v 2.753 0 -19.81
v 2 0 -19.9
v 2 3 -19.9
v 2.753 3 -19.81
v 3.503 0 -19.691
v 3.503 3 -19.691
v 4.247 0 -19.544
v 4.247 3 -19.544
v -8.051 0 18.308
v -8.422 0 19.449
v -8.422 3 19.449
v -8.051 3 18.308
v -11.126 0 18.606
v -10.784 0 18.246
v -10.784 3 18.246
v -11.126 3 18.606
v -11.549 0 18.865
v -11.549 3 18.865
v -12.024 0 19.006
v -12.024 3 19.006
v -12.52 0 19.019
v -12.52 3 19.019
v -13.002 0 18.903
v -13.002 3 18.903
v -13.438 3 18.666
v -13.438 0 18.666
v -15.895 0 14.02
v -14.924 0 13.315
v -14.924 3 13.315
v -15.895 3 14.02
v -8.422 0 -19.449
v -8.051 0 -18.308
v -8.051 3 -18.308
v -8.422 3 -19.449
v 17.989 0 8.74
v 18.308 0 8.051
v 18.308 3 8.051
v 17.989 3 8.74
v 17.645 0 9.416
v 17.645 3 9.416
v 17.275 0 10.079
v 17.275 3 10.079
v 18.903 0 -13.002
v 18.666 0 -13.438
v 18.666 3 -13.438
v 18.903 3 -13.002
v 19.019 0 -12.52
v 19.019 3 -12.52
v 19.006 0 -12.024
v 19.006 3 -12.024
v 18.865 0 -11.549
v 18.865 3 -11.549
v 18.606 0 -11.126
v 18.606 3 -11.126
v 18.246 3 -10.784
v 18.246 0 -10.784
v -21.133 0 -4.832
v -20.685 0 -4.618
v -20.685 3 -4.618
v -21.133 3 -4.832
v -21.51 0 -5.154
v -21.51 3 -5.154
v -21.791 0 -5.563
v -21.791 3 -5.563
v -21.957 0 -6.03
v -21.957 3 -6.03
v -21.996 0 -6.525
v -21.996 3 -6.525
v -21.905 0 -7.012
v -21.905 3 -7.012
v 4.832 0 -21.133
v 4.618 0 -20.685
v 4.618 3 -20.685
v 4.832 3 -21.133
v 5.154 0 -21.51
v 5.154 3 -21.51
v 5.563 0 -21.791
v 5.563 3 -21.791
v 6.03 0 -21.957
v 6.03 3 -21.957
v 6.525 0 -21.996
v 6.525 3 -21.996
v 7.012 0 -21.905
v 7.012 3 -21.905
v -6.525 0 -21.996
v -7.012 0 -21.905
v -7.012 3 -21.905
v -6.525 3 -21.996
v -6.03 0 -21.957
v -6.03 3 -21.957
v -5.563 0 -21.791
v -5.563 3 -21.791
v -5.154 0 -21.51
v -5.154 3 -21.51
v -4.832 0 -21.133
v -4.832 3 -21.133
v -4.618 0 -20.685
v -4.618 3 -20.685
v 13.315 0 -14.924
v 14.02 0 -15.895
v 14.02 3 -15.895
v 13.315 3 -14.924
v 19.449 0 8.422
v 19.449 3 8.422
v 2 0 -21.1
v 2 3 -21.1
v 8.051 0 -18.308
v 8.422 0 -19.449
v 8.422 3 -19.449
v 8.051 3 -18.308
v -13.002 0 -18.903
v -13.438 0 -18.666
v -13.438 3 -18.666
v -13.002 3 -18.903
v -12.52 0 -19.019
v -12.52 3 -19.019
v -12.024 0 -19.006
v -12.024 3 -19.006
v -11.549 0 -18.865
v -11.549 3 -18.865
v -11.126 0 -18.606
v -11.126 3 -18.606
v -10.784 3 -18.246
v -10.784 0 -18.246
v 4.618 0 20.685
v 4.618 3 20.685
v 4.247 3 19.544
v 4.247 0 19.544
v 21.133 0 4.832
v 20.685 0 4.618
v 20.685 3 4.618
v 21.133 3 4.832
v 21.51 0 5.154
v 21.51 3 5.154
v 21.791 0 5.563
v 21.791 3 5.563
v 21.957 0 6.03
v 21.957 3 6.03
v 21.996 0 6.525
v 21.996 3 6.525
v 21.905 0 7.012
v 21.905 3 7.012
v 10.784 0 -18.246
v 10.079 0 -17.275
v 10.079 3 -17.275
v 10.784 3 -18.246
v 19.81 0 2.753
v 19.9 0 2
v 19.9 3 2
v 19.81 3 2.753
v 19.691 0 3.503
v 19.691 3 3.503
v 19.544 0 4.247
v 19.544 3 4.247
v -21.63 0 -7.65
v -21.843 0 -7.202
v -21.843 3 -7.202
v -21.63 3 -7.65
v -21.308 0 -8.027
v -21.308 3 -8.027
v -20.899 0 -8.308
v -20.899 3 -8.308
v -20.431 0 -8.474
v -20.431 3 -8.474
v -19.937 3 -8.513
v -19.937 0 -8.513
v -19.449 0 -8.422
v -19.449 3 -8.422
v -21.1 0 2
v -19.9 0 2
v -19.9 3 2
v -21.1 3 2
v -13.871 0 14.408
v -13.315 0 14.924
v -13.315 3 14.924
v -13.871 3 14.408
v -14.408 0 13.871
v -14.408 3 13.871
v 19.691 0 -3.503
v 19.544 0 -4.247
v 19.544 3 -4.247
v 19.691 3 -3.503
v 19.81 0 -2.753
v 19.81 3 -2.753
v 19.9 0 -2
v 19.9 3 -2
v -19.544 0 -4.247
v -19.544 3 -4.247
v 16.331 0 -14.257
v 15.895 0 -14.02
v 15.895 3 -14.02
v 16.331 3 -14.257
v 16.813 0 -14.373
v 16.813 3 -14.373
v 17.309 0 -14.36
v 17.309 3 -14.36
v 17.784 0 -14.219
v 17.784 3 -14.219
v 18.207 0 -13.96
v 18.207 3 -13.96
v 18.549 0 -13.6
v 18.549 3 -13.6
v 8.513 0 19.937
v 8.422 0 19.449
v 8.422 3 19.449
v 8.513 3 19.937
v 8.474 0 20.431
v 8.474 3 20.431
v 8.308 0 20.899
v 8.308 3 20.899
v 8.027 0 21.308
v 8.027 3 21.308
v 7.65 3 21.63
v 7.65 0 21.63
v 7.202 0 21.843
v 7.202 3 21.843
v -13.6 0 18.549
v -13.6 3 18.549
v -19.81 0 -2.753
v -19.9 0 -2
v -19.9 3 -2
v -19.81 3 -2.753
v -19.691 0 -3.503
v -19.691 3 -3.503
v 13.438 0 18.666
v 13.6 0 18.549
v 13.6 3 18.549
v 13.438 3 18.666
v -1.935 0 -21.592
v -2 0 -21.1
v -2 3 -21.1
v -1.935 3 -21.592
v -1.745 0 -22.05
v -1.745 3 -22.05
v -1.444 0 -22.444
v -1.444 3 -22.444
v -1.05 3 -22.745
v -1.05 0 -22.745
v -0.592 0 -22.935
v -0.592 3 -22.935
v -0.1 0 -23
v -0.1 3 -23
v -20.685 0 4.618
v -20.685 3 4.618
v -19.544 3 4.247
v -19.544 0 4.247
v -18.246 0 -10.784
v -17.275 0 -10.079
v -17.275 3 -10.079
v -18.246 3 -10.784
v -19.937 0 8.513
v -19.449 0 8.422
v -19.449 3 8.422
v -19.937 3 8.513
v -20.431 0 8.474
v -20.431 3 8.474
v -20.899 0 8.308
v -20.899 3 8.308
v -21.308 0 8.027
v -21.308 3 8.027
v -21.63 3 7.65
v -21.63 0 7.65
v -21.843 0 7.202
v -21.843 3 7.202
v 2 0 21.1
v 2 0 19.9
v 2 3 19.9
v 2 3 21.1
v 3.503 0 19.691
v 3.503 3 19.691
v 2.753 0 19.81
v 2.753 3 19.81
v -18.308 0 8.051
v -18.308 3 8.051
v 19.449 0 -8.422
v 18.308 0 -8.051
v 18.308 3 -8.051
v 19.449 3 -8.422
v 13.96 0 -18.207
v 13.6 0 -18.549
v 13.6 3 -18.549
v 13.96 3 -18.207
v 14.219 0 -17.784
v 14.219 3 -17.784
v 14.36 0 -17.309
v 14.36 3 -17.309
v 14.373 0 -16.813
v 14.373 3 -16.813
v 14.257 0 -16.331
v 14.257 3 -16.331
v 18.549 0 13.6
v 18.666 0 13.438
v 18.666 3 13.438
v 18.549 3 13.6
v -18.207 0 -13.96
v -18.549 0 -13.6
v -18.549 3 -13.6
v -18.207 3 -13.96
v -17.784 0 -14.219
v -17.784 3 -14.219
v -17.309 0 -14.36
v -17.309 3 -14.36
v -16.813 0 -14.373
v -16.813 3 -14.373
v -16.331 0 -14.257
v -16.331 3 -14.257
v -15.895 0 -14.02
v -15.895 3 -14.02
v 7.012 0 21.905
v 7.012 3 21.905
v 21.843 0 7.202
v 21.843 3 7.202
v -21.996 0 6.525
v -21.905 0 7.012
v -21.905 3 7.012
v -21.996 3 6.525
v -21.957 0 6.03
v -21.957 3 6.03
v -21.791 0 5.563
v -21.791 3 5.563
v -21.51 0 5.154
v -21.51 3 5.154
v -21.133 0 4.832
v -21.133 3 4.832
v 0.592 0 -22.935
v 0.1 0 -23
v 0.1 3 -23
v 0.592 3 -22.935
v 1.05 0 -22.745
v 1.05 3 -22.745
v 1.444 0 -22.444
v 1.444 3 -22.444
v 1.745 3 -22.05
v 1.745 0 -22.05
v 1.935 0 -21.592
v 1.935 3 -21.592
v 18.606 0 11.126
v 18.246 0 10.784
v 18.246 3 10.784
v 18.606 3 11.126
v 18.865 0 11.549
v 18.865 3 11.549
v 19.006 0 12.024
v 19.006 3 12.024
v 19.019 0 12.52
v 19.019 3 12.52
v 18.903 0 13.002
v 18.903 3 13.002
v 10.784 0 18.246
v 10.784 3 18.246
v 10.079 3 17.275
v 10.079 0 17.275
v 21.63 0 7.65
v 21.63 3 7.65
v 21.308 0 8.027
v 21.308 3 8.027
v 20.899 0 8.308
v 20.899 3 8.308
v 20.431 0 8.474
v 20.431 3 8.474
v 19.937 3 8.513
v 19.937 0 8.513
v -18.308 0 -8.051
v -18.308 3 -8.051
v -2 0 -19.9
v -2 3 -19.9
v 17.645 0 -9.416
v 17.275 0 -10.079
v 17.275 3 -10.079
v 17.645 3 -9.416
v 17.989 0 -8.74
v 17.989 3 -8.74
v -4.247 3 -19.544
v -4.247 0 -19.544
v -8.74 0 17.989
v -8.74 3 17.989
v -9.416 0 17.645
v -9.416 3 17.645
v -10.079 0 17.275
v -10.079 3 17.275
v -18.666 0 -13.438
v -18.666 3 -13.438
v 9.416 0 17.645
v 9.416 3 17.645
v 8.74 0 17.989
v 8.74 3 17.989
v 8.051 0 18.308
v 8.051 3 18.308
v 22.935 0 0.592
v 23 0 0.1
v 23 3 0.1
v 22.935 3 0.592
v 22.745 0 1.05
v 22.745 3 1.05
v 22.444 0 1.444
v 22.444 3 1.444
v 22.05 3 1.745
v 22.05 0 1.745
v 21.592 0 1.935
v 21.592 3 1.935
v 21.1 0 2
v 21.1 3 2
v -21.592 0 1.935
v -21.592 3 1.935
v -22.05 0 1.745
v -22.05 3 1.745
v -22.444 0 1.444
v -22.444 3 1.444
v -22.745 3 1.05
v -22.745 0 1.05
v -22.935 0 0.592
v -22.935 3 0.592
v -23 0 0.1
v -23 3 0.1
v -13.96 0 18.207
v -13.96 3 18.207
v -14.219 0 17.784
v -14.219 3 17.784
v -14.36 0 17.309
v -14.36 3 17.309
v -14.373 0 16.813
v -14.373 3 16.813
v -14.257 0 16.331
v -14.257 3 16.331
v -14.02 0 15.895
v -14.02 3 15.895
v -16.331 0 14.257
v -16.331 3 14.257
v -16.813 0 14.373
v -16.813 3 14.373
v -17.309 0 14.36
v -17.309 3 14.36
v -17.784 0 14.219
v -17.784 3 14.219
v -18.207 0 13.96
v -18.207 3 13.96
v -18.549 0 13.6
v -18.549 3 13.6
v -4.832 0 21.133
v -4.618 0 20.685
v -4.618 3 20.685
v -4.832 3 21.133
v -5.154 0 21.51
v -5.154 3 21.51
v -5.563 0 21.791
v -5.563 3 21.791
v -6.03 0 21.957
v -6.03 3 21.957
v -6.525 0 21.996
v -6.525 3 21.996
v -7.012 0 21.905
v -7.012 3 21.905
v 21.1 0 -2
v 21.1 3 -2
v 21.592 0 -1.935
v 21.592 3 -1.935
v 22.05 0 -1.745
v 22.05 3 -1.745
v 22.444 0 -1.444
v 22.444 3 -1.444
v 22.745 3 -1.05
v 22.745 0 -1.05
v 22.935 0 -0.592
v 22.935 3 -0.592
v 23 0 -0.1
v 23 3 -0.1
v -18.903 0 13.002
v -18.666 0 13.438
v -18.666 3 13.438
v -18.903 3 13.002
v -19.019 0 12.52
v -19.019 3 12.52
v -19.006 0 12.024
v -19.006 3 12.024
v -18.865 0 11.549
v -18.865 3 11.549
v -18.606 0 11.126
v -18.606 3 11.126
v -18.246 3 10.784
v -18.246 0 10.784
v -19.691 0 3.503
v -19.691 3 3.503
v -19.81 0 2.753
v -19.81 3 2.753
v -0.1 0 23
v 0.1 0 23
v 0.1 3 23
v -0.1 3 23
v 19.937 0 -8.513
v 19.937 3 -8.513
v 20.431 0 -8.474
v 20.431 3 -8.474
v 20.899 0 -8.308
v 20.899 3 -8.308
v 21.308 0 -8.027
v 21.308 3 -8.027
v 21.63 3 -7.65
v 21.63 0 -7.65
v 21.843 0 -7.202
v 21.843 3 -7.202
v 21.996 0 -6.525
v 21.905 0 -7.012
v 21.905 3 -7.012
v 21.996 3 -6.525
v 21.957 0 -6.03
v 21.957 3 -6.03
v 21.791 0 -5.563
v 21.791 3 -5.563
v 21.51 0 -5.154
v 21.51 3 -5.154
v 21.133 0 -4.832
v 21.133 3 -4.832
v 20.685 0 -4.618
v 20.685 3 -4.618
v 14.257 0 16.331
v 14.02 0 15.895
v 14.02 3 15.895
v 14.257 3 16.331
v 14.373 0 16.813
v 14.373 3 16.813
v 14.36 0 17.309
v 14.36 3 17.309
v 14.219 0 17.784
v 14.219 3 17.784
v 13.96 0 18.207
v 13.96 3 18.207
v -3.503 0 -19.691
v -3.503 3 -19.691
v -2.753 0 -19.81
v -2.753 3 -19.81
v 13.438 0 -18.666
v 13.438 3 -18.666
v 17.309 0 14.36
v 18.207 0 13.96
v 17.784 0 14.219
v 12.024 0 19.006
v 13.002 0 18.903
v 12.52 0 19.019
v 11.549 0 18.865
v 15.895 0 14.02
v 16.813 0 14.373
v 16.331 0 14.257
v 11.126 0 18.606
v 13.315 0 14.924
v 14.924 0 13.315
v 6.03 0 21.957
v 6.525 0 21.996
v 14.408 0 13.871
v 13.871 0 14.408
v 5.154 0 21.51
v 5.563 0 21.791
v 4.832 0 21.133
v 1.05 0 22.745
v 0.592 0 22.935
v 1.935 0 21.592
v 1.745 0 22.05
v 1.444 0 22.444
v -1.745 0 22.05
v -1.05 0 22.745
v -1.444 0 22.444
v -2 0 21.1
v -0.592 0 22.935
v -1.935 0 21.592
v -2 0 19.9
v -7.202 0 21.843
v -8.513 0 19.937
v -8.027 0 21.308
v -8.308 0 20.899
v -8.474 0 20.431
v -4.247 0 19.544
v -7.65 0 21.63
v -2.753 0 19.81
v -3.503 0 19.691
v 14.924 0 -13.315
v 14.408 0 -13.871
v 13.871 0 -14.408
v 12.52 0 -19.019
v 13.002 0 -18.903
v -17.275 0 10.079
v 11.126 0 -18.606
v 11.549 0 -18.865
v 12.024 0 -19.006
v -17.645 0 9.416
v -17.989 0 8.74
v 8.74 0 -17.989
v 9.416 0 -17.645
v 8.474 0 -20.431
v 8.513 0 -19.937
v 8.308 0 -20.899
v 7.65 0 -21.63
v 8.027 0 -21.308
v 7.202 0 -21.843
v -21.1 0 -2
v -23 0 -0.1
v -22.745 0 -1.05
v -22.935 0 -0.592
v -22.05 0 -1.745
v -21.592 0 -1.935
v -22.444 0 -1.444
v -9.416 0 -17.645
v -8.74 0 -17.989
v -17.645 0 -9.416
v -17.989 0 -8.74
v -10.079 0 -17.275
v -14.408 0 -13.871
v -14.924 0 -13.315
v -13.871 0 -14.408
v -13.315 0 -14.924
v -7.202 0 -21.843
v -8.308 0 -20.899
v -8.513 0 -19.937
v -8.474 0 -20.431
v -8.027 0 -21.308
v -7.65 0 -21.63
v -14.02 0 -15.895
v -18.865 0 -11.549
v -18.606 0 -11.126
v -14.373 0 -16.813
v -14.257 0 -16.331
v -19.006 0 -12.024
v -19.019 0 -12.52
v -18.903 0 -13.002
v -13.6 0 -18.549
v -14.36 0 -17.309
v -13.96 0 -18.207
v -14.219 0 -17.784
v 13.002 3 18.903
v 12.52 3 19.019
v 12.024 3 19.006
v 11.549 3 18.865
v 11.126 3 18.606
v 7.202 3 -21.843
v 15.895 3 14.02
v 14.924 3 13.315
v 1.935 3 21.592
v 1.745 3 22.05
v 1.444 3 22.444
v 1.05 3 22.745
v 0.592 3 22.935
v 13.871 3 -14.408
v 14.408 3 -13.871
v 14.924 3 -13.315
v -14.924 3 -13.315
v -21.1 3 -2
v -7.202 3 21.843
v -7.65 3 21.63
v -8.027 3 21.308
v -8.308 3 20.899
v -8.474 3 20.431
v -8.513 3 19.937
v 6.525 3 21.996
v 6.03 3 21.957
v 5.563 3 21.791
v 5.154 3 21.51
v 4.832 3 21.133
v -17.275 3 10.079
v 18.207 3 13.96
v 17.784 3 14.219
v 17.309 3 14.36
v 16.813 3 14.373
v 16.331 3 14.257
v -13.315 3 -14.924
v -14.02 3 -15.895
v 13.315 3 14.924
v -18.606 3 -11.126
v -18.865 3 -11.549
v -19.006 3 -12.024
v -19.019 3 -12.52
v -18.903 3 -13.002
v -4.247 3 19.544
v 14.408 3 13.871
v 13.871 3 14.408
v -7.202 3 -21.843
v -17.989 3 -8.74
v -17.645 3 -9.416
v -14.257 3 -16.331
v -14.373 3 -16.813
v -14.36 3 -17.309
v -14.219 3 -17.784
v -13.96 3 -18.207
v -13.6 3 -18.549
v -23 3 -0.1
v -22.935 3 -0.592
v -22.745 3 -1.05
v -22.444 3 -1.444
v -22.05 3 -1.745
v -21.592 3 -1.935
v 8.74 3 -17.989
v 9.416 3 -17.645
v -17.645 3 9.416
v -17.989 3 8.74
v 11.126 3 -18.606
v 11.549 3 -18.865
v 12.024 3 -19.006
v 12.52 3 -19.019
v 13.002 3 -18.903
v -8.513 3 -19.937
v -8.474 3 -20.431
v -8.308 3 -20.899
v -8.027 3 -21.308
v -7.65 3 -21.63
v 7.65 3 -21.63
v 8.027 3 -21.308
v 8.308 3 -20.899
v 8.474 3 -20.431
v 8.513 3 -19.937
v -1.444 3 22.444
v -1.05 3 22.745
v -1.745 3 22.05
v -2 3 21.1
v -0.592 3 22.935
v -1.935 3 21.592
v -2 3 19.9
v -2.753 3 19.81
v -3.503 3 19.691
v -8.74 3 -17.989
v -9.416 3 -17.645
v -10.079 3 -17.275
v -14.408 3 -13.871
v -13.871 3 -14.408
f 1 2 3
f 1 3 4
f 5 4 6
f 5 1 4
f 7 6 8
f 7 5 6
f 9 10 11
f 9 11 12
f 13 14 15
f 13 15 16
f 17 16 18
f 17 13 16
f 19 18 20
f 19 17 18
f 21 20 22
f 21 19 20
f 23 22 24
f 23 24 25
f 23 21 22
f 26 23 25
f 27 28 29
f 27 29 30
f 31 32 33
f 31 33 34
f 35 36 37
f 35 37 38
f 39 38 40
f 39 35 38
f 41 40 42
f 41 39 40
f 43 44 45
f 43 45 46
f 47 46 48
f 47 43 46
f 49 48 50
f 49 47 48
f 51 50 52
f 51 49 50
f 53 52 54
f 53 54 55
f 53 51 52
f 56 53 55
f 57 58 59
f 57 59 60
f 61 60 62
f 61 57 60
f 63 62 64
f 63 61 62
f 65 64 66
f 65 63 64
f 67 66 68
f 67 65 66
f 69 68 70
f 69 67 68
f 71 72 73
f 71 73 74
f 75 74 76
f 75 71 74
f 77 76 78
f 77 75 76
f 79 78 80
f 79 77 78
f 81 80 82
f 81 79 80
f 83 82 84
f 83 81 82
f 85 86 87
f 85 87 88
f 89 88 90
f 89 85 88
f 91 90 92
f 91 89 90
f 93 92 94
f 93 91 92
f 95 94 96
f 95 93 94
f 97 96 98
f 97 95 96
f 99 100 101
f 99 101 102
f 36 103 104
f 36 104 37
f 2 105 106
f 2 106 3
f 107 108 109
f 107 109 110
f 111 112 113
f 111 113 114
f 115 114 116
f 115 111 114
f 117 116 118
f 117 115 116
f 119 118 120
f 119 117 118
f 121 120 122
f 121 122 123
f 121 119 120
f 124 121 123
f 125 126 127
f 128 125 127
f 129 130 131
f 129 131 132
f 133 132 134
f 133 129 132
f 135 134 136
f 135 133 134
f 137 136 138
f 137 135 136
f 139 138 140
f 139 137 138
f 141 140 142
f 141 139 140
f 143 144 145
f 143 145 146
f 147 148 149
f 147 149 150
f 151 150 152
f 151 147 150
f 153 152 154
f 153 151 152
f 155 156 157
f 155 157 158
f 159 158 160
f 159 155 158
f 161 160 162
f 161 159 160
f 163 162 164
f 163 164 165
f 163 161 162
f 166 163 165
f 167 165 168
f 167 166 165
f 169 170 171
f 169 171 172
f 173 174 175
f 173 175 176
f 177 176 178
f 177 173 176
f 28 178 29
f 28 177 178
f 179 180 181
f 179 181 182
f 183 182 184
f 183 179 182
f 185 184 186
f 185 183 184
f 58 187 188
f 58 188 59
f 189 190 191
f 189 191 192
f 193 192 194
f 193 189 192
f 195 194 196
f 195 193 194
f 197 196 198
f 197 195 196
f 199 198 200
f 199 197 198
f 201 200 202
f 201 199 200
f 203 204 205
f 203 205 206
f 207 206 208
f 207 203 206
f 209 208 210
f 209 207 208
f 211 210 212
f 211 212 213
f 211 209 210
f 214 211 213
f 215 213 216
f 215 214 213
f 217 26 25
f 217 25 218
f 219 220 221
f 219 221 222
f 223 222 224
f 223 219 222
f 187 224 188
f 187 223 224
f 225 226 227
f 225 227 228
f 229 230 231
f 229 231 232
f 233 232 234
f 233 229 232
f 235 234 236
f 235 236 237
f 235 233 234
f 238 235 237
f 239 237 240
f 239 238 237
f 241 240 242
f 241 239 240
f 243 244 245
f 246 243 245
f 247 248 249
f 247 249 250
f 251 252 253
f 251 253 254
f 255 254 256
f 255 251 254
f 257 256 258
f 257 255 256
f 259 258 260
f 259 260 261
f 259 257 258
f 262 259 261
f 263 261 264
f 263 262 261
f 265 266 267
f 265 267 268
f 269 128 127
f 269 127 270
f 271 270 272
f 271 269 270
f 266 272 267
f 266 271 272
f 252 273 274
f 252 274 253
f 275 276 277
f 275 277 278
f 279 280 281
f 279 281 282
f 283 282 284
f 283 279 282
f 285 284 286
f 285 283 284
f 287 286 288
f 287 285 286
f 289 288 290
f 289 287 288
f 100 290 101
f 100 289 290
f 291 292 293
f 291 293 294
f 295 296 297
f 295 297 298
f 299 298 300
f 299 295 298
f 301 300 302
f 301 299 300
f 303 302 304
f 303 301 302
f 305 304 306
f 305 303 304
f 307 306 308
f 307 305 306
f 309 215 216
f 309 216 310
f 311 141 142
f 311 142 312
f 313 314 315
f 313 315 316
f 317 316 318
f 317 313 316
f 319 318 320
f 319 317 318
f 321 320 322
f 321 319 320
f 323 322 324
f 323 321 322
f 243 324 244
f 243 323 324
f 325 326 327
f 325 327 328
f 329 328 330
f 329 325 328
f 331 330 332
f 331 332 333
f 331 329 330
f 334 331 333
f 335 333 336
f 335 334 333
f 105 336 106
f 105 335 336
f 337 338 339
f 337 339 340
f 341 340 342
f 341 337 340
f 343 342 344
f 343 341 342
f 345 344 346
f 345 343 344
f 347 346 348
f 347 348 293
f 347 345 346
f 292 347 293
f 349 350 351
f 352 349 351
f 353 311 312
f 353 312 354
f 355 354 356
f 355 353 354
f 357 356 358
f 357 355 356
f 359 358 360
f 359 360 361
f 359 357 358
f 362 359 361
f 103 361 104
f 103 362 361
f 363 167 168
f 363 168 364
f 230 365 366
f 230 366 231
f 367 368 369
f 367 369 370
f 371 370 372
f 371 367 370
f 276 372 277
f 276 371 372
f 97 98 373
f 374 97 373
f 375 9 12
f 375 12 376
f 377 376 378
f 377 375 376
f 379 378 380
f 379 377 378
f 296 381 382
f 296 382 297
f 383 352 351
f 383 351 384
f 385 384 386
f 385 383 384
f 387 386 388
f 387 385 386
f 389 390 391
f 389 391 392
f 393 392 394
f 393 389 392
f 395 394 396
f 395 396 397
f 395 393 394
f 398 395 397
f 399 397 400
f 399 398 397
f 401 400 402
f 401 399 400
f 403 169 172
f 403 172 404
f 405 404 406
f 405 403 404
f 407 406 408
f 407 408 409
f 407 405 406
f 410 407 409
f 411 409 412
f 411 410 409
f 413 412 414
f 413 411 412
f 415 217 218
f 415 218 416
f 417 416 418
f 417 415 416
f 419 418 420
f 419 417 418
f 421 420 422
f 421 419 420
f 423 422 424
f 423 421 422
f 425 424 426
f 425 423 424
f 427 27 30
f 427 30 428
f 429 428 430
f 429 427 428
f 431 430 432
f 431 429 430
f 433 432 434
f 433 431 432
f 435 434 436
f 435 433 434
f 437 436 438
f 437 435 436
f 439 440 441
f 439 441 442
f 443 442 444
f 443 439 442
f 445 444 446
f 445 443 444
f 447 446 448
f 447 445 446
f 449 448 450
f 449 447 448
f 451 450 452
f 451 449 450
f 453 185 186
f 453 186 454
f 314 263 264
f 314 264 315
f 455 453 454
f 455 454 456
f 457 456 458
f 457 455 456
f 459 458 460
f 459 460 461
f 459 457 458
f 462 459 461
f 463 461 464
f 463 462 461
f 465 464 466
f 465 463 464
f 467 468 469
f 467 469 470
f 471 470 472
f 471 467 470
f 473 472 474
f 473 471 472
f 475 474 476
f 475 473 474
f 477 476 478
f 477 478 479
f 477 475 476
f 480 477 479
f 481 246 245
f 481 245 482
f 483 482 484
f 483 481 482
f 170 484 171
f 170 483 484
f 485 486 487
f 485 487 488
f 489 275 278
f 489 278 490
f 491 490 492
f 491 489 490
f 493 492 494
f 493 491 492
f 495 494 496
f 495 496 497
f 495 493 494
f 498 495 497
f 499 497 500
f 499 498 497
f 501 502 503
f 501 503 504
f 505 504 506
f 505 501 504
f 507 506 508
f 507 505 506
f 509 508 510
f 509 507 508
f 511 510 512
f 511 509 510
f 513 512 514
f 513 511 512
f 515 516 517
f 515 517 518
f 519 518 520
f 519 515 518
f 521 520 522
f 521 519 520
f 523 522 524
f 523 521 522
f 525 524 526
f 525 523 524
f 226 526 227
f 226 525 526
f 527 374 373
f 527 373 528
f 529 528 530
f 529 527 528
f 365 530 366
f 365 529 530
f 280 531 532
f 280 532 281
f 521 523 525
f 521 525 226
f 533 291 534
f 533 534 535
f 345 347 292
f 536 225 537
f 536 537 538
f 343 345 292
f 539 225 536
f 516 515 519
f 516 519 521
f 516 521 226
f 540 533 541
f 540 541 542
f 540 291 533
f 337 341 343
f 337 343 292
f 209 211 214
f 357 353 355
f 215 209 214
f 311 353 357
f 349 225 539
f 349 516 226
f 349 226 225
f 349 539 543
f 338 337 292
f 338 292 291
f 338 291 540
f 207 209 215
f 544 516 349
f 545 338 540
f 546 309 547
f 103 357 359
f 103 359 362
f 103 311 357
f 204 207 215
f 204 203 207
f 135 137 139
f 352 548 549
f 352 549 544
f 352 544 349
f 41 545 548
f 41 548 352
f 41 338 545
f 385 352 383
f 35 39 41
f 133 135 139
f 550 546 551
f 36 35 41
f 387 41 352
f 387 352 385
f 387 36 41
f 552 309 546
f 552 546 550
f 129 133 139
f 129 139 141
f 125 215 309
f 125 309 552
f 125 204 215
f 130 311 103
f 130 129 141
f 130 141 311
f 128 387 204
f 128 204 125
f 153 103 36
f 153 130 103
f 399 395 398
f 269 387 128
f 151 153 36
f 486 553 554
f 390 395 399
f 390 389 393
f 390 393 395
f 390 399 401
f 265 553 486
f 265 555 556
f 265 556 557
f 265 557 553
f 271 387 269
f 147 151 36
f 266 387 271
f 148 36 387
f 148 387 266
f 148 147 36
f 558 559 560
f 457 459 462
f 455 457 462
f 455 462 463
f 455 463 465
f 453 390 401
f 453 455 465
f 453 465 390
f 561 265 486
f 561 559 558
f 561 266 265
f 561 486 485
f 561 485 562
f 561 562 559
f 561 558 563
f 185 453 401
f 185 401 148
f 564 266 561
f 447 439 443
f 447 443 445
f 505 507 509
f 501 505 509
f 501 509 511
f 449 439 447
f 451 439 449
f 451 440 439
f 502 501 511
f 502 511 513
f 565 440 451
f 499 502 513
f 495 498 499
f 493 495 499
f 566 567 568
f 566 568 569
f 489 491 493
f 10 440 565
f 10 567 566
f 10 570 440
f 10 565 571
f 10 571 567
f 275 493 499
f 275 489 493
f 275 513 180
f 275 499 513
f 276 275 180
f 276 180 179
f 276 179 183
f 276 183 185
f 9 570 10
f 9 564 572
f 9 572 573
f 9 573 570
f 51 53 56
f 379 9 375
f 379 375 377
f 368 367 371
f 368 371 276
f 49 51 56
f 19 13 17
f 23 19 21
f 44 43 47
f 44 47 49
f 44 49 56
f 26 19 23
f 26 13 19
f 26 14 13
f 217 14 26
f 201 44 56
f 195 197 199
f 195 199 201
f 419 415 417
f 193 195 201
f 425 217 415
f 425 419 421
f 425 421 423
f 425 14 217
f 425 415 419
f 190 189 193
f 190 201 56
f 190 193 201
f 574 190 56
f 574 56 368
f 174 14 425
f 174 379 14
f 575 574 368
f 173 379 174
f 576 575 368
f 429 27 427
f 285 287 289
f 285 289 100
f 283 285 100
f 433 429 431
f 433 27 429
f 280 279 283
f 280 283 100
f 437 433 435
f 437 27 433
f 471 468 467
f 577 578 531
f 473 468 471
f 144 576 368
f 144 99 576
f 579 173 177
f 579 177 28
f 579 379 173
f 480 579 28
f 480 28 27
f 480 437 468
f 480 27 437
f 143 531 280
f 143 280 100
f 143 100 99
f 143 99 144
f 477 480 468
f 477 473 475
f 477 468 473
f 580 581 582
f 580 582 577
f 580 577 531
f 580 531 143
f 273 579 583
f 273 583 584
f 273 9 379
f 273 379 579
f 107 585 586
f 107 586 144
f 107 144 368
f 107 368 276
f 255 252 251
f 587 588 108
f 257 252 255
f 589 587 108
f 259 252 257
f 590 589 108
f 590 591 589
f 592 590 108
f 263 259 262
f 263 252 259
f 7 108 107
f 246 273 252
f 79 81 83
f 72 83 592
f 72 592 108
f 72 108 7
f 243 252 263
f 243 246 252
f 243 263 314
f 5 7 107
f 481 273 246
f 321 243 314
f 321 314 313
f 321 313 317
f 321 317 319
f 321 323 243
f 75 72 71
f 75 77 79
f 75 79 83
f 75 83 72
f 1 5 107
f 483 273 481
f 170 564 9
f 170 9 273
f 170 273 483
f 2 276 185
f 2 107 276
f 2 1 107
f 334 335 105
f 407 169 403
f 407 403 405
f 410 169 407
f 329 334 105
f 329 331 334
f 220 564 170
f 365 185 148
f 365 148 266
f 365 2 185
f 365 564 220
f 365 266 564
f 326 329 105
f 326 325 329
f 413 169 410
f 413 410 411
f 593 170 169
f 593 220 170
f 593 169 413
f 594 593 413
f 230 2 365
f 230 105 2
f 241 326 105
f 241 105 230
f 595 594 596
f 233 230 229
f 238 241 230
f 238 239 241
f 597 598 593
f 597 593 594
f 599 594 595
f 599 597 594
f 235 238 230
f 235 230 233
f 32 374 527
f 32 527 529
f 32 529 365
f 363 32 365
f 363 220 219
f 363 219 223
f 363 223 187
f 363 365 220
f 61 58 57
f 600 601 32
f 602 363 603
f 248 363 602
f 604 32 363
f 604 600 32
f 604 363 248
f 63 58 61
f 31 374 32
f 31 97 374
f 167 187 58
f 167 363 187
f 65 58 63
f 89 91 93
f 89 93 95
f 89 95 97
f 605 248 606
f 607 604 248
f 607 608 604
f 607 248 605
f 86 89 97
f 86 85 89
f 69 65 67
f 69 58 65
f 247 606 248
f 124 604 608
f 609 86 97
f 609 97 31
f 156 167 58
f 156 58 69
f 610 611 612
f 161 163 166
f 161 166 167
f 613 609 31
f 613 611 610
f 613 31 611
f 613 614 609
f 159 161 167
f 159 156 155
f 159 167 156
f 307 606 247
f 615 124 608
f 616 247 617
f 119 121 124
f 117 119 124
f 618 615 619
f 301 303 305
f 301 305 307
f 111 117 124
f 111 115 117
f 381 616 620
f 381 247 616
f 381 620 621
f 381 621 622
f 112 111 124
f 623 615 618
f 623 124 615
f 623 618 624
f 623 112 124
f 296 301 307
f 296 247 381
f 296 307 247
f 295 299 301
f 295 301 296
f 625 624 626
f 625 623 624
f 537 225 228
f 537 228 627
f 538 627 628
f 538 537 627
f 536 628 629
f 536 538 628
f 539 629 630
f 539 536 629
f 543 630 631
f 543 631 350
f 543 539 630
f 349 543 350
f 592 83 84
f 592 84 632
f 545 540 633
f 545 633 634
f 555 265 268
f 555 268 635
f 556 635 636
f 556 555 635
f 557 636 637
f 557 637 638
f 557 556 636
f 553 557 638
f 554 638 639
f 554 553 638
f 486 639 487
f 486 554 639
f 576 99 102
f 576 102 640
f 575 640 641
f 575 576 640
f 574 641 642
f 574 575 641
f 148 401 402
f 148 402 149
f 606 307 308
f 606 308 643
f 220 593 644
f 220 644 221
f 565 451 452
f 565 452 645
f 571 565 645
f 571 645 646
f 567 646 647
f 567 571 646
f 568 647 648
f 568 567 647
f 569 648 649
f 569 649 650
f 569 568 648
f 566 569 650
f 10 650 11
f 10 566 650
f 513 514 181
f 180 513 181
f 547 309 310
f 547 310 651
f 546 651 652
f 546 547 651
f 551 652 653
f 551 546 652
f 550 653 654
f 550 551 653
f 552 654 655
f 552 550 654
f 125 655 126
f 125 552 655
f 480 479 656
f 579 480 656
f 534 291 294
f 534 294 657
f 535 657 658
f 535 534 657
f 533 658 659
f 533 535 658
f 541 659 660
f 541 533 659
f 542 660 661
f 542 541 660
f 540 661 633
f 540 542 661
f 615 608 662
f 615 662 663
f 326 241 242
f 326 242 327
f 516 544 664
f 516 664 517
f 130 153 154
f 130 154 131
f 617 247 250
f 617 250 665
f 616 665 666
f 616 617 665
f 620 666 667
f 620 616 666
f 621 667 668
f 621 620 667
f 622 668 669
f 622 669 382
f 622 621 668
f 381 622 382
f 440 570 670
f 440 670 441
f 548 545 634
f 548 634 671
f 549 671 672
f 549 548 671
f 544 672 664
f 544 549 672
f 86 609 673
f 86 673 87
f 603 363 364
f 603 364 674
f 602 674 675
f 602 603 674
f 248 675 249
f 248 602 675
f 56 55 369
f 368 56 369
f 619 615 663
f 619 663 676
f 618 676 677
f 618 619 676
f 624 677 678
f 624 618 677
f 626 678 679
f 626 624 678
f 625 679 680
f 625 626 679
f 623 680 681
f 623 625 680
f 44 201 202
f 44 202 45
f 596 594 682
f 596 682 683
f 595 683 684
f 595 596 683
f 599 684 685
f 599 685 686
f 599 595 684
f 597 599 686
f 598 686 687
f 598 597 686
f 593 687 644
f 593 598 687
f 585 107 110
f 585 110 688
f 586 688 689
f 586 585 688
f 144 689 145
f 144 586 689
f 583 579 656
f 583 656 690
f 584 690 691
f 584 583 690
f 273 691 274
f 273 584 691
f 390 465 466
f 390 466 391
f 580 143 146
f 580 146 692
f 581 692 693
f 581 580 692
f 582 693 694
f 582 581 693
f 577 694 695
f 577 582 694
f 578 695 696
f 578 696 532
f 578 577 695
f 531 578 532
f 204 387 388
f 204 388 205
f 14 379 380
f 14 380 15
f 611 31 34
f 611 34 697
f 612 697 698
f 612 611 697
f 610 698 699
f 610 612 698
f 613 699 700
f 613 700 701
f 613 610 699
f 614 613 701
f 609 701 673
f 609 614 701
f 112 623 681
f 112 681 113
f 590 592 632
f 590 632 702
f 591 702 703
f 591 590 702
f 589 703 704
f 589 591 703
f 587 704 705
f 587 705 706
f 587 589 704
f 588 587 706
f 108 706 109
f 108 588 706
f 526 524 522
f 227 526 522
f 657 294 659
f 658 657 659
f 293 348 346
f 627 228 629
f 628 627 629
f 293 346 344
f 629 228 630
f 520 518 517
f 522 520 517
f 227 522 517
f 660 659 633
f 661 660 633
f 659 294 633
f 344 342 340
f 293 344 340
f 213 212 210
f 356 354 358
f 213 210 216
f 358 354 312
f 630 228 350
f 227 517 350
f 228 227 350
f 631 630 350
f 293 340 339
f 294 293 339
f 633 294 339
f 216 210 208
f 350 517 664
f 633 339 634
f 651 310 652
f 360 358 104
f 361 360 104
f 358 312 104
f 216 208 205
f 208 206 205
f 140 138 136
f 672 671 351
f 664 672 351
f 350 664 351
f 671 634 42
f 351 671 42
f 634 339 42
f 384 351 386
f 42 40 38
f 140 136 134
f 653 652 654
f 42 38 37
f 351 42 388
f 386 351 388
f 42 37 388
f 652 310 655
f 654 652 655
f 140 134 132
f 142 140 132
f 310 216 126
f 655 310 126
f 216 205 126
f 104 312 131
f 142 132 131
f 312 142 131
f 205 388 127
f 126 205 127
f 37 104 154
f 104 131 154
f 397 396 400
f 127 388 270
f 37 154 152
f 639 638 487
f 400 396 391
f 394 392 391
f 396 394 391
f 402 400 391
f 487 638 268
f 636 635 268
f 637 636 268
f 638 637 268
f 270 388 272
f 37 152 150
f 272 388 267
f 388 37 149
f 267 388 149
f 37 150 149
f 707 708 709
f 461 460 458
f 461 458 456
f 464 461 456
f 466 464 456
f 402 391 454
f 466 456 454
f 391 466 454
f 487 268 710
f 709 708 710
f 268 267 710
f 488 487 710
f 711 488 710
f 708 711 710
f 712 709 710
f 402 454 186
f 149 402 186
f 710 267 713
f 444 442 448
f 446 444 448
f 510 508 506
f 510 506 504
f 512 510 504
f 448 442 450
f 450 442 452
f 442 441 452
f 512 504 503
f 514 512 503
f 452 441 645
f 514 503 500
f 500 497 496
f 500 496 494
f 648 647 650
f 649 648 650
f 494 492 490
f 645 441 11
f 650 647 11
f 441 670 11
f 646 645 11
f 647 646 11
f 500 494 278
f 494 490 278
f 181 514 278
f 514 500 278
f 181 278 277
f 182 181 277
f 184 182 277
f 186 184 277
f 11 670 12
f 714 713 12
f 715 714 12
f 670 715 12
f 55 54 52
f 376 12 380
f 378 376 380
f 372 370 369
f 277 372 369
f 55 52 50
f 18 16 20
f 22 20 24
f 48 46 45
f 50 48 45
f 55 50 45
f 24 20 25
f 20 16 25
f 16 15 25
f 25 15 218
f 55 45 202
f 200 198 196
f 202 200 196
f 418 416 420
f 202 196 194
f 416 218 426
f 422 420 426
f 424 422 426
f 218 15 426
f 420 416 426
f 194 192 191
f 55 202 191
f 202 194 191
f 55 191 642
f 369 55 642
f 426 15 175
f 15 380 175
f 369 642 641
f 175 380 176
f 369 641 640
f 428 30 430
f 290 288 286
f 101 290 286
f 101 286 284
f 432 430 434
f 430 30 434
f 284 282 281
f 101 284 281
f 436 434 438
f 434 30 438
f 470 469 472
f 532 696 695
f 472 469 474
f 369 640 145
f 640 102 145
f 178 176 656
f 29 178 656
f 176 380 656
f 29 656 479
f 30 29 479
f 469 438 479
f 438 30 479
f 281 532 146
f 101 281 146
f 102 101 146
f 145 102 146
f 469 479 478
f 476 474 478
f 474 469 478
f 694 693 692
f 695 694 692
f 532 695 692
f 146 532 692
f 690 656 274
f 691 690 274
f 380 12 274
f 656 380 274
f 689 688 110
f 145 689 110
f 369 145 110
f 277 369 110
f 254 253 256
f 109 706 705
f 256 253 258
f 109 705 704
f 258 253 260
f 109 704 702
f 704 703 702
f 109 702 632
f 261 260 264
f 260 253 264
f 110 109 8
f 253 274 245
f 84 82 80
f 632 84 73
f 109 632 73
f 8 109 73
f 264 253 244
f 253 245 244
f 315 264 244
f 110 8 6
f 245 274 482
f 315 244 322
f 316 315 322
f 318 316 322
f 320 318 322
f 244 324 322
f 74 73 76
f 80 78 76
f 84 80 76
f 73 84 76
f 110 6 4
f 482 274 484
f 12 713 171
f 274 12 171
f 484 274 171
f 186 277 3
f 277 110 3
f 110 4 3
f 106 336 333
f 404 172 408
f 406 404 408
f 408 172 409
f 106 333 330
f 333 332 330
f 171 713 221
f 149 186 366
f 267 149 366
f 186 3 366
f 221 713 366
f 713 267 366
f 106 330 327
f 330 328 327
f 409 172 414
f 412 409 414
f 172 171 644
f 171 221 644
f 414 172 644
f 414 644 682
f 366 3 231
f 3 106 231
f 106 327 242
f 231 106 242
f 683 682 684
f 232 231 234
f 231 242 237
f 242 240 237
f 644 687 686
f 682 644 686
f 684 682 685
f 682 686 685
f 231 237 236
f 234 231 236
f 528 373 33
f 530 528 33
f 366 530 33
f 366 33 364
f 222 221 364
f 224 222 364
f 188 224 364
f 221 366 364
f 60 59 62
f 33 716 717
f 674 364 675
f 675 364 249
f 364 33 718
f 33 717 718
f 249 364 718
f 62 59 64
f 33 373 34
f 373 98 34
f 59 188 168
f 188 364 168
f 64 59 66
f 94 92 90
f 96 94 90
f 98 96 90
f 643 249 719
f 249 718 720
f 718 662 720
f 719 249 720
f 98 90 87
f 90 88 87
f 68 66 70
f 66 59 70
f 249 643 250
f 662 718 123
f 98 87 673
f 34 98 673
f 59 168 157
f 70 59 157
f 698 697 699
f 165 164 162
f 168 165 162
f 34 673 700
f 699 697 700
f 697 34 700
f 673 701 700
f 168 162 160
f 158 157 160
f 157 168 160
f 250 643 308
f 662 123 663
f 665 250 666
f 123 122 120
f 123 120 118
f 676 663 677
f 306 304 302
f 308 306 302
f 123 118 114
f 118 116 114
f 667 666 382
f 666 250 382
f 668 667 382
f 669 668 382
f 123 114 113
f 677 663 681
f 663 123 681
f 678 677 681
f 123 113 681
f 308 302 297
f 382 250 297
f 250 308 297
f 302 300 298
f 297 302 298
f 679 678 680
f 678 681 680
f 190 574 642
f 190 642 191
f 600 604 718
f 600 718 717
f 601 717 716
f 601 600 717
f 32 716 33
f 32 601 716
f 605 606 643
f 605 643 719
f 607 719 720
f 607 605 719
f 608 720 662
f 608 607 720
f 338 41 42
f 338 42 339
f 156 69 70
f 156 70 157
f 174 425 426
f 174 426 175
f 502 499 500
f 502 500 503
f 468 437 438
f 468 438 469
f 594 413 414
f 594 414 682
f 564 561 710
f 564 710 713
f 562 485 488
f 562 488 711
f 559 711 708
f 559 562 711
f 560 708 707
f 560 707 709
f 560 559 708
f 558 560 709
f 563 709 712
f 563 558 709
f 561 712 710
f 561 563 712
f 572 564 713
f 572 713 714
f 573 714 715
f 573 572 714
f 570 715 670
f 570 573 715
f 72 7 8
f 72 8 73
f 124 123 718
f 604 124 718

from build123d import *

# Parameters (mm, degrees)
BOSS_EXTRUDE1_DEPTH = 3
BOSS_EXTRUDE2_DEPTH = 3


with BuildPart() as part:
    # Sketch1 → Boss-Extrude1 (new body)
    with BuildSketch(Plane(origin=(0, 0, 0), x_dir=(1, 0, 0), z_dir=(0, 1, 0))):
        with BuildLine():
            Line((2.5, 1.5), (2.5, 0))
            Line((2.5, 0), (13, 0))
            Line((13, 0), (13, 0.1))
            ThreePointArc((13, 0.1), (12.443502884, 1.443502884), (11.1, 2))
            Line((11.1, 2), (9.797958971, 2))
            ThreePointArc((9.797958971, 2), (9.510565163, 3.090169944), (9.102285822, 4.141061797))
            Line((9.102285822, 4.141061797), (10.155659142, 4.906382312))
            ThreePointArc((10.155659142, 4.906382312), (10.91547501, 6.146289117), (10.575999452, 7.56030658))
            Line((10.575999452, 7.56030658), (10.458442402, 7.722109979))
            ThreePointArc((10.458442402, 7.722109979), (9.218535596, 8.481925847), (7.804518133, 8.142450289))
            Line((7.804518133, 8.142450289), (6.751144813, 7.377129775))
            ThreePointArc((6.751144813, 7.377129775), (5.877852523, 8.090169944), (4.929848865, 8.700378737))
            Line((4.929848865, 8.700378737), (5.33220167, 9.938693342))
            ThreePointArc((5.33220167, 9.938693342), (5.218106685, 11.388407581), (4.112326579, 12.332833012))
            Line((4.112326579, 12.332833012), (3.922115275, 12.394636411))
            ThreePointArc((3.922115275, 12.394636411), (2.472401036, 12.280541426), (1.527975605, 11.17476132))
            Line((1.527975605, 11.17476132), (1.1256228, 9.936446715))
            ThreePointArc((1.1256228, 9.936446715), (0.563707749, 9.984099037), (0, 10))
            Line((0, 10), (0, 1.5))
            Line((0, 1.5), (2.5, 1.5))
        make_face()
        with BuildLine():
            Line((-13, 0), (-2.5, 0))
            Line((-2.5, 0), (-2.5, 1.5))
            Line((-2.5, 1.5), (0, 1.5))
            Line((0, 1.5), (0, 10))
            ThreePointArc((0, 10), (-0.563707749, 9.984099037), (-1.1256228, 9.936446715))
            Line((-1.1256228, 9.936446715), (-1.527975605, 11.17476132))
            ThreePointArc((-1.527975605, 11.17476132), (-2.472401036, 12.280541426), (-3.922115275, 12.394636411))
            Line((-3.922115275, 12.394636411), (-4.112326579, 12.332833012))
            ThreePointArc((-4.112326579, 12.332833012), (-5.218106685, 11.388407581), (-5.33220167, 9.938693342))
            Line((-5.33220167, 9.938693342), (-4.929848865, 8.700378737))
            ThreePointArc((-4.929848865, 8.700378737), (-5.877852523, 8.090169944), (-6.751144813, 7.377129775))
            Line((-6.751144813, 7.377129775), (-7.804518133, 8.142450289))
            ThreePointArc((-7.804518133, 8.142450289), (-9.218535596, 8.481925847), (-10.458442402, 7.722109979))
            Line((-10.458442402, 7.722109979), (-10.575999452, 7.56030658))
            ThreePointArc((-10.575999452, 7.56030658), (-10.91547501, 6.146289117), (-10.155659142, 4.906382312))
            Line((-10.155659142, 4.906382312), (-9.102285822, 4.141061797))
            ThreePointArc((-9.102285822, 4.141061797), (-9.510565163, 3.090169944), (-9.797958971, 2))
            Line((-9.797958971, 2), (-11.1, 2))
            ThreePointArc((-11.1, 2), (-12.443502884, 1.443502884), (-13, 0.1))
            Line((-13, 0.1), (-13, 0))
        make_face()
        with BuildLine():
            ThreePointArc((-1.1256228, -9.936446715), (-0.563707749, -9.984099037), (0, -10))
            Line((0, -10), (0, -1.5))
            Line((0, -1.5), (-2.5, -1.5))
            Line((-2.5, -1.5), (-2.5, 0))
            Line((-2.5, 0), (-13, 0))
            Line((-13, 0), (-13, -0.1))
            ThreePointArc((-13, -0.1), (-12.443502884, -1.443502884), (-11.1, -2))
            Line((-11.1, -2), (-9.797958971, -2))
            ThreePointArc((-9.797958971, -2), (-9.510565163, -3.090169944), (-9.102285822, -4.141061797))
            Line((-9.102285822, -4.141061797), (-10.155659142, -4.906382312))
            ThreePointArc((-10.155659142, -4.906382312), (-10.91547501, -6.146289117), (-10.575999452, -7.56030658))
            Line((-10.575999452, -7.56030658), (-10.458442402, -7.722109979))
            ThreePointArc((-10.458442402, -7.722109979), (-9.218535596, -8.481925847), (-7.804518133, -8.142450289))
            Line((-7.804518133, -8.142450289), (-6.751144813, -7.377129775))
            ThreePointArc((-6.751144813, -7.377129775), (-5.877852523, -8.090169944), (-4.929848865, -8.700378737))
            Line((-4.929848865, -8.700378737), (-5.33220167, -9.938693342))
            ThreePointArc((-5.33220167, -9.938693342), (-5.218106685, -11.388407581), (-4.112326579, -12.332833012))
            Line((-4.112326579, -12.332833012), (-3.922115275, -12.394636411))
            ThreePointArc((-3.922115275, -12.394636411), (-2.472401036, -12.280541426), (-1.527975605, -11.17476132))
            Line((-1.527975605, -11.17476132), (-1.1256228, -9.936446715))
        make_face()
        with BuildLine():
            Line((0, -1.5), (0, -10))
            ThreePointArc((0, -10), (0.563707749, -9.984099037), (1.1256228, -9.936446715))
            Line((1.1256228, -9.936446715), (1.527975605, -11.17476132))
            ThreePointArc((1.527975605, -11.17476132), (2.472401036, -12.280541426), (3.922115275, -12.394636411))
            Line((3.922115275, -12.394636411), (4.112326579, -12.332833012))
            ThreePointArc((4.112326579, -12.332833012), (5.218106685, -11.388407581), (5.33220167, -9.938693342))
            Line((5.33220167, -9.938693342), (4.929848865, -8.700378737))
            ThreePointArc((4.929848865, -8.700378737), (5.877852523, -8.090169944), (6.751144813, -7.377129775))
            Line((6.751144813, -7.377129775), (7.804518133, -8.142450289))
            ThreePointArc((7.804518133, -8.142450289), (9.218535596, -8.481925847), (10.458442402, -7.722109979))
            Line((10.458442402, -7.722109979), (10.575999452, -7.56030658))
            ThreePointArc((10.575999452, -7.56030658), (10.91547501, -6.146289117), (10.155659142, -4.906382312))
            Line((10.155659142, -4.906382312), (9.102285822, -4.141061797))
            ThreePointArc((9.102285822, -4.141061797), (9.510565163, -3.090169944), (9.797958971, -2))
            Line((9.797958971, -2), (11.1, -2))
            ThreePointArc((11.1, -2), (12.443502884, -1.443502884), (13, -0.1))
            Line((13, -0.1), (13, 0))
            Line((13, 0), (2.5, 0))
            Line((2.5, 0), (2.5, -1.5))
            Line((2.5, -1.5), (0, -1.5))
        make_face()
    extrude(amount=BOSS_EXTRUDE1_DEPTH)

    # Sketch2 → Boss-Extrude2 (add)
    with BuildSketch(Plane(origin=(0, 0, 0), x_dir=(1, 0, 0), z_dir=(0, 1, 0))):
        with BuildLine():
            Line((-23, -0.1), (-23, 0.1))
            ThreePointArc((-23, 0.1), (-22.443502884, 1.443502884), (-21.1, 2))
            Line((-21.1, 2), (-19.899748742, 2))
            ThreePointArc((-19.899748742, 2), (-19.753766812, 3.128689301), (-19.543819703, 4.247247513))
            Line((-19.543819703, 4.247247513), (-20.685326483, 4.618145549))
            ThreePointArc((-20.685326483, 4.618145549), (-21.791106589, 5.56257098), (-21.905201574, 7.012285219))
            Line((-21.905201574, 7.012285219), (-21.843398175, 7.202496522))
            ThreePointArc((-21.843398175, 7.202496522), (-20.898972744, 8.308276629), (-19.449258505, 8.422371614))
            Line((-19.449258505, 8.422371614), (-18.307751725, 8.051473578))
            ThreePointArc((-18.307751725, 8.051473578), (-17.820130484, 9.079809995), (-17.274805421, 10.078744846))
            Line((-17.274805421, 10.078744846), (-18.245829086, 10.784234835))
            ThreePointArc((-18.245829086, 10.784234835), (-19.005644954, 12.02414164), (-18.666169396, 13.438159103))
            Line((-18.666169396, 13.438159103), (-18.548612345, 13.599962502))
            ThreePointArc((-18.548612345, 13.599962502), (-17.30870554, 14.35977837), (-15.894688077, 14.020302812))
            Line((-15.894688077, 14.020302812), (-14.923664412, 13.314812824))
            ThreePointArc((-14.923664412, 13.314812824), (-14.142135624, 14.142135624), (-13.314812824, 14.923664412))
            Line((-13.314812824, 14.923664412), (-14.020302812, 15.894688077))
            ThreePointArc((-14.020302812, 15.894688077), (-14.35977837, 17.30870554), (-13.599962502, 18.548612345))
            Line((-13.599962502, 18.548612345), (-13.438159103, 18.666169396))
            ThreePointArc((-13.438159103, 18.666169396), (-12.02414164, 19.005644954), (-10.784234835, 18.245829086))
            Line((-10.784234835, 18.245829086), (-10.078744846, 17.274805421))
            ThreePointArc((-10.078744846, 17.274805421), (-9.079809995, 17.820130484), (-8.051473578, 18.307751725))
            Line((-8.051473578, 18.307751725), (-8.422371614, 19.449258505))
            ThreePointArc((-8.422371614, 19.449258505), (-8.308276629, 20.898972744), (-7.202496522, 21.843398175))
            Line((-7.202496522, 21.843398175), (-7.012285219, 21.905201574))
            ThreePointArc((-7.012285219, 21.905201574), (-5.56257098, 21.791106589), (-4.618145549, 20.685326483))
            Line((-4.618145549, 20.685326483), (-4.247247513, 19.543819703))
            ThreePointArc((-4.247247513, 19.543819703), (-3.128689301, 19.753766812), (-2, 19.899748742))
            Line((-2, 19.899748742), (-2, 21.1))
            ThreePointArc((-2, 21.1), (-1.443502884, 22.443502884), (-0.1, 23))
            Line((-0.1, 23), (0.1, 23))
            ThreePointArc((0.1, 23), (1.443502884, 22.443502884), (2, 21.1))
            Line((2, 21.1), (2, 19.899748742))
            ThreePointArc((2, 19.899748742), (3.128689301, 19.753766812), (4.247247513, 19.543819703))
            Line((4.247247513, 19.543819703), (4.618145549, 20.685326483))
            ThreePointArc((4.618145549, 20.685326483), (5.56257098, 21.791106589), (7.012285219, 21.905201574))
            Line((7.012285219, 21.905201574), (7.202496522, 21.843398175))
            ThreePointArc((7.202496522, 21.843398175), (8.308276629, 20.898972744), (8.422371614, 19.449258505))
            Line((8.422371614, 19.449258505), (8.051473578, 18.307751725))
            ThreePointArc((8.051473578, 18.307751725), (9.079809995, 17.820130484), (10.078744846, 17.274805421))
            Line((10.078744846, 17.274805421), (10.784234835, 18.245829086))
            ThreePointArc((10.784234835, 18.245829086), (12.02414164, 19.005644954), (13.438159103, 18.666169396))
            Line((13.438159103, 18.666169396), (13.599962502, 18.548612345))
            ThreePointArc((13.599962502, 18.548612345), (14.35977837, 17.30870554), (14.020302812, 15.894688077))
            Line((14.020302812, 15.894688077), (13.314812824, 14.923664412))
            ThreePointArc((13.314812824, 14.923664412), (14.142135624, 14.142135624), (14.923664412, 13.314812824))
            Line((14.923664412, 13.314812824), (15.894688077, 14.020302812))
            ThreePointArc((15.894688077, 14.020302812), (17.30870554, 14.35977837), (18.548612345, 13.599962502))
            Line((18.548612345, 13.599962502), (18.666169396, 13.438159103))
            ThreePointArc((18.666169396, 13.438159103), (19.005644954, 12.02414164), (18.245829086, 10.784234835))
            Line((18.245829086, 10.784234835), (17.274805421, 10.078744846))
            ThreePointArc((17.274805421, 10.078744846), (17.820130484, 9.079809995), (18.307751725, 8.051473578))
            Line((18.307751725, 8.051473578), (19.449258505, 8.422371614))
            ThreePointArc((19.449258505, 8.422371614), (20.898972744, 8.308276629), (21.843398175, 7.202496522))
            Line((21.843398175, 7.202496522), (21.905201574, 7.012285219))
            ThreePointArc((21.905201574, 7.012285219), (21.791106589, 5.56257098), (20.685326483, 4.618145549))
            Line((20.685326483, 4.618145549), (19.543819703, 4.247247513))
            ThreePointArc((19.543819703, 4.247247513), (19.753766812, 3.128689301), (19.899748742, 2))
            Line((19.899748742, 2), (21.1, 2))
            ThreePointArc((21.1, 2), (22.443502884, 1.443502884), (23, 0.1))
            Line((23, 0.1), (23, -0.1))
            ThreePointArc((23, -0.1), (22.443502884, -1.443502884), (21.1, -2))
            Line((21.1, -2), (19.899748742, -2))
            ThreePointArc((19.899748742, -2), (19.753766812, -3.128689301), (19.543819703, -4.247247513))
            Line((19.543819703, -4.247247513), (20.685326483, -4.618145549))
            ThreePointArc((20.685326483, -4.618145549), (21.791106589, -5.56257098), (21.905201574, -7.012285219))
            Line((21.905201574, -7.012285219), (21.843398175, -7.202496522))
            ThreePointArc((21.843398175, -7.202496522), (20.898972744, -8.308276629), (19.449258505, -8.422371614))
            Line((19.449258505, -8.422371614), (18.307751725, -8.051473578))
            ThreePointArc((18.307751725, -8.051473578), (17.820130484, -9.079809995), (17.274805421, -10.078744846))
            Line((17.274805421, -10.078744846), (18.245829086, -10.784234835))
            ThreePointArc((18.245829086, -10.784234835), (19.005644954, -12.02414164), (18.666169396, -13.438159103))
            Line((18.666169396, -13.438159103), (18.548612345, -13.599962502))
            ThreePointArc((18.548612345, -13.599962502), (17.30870554, -14.35977837), (15.894688077, -14.020302812))
            Line((15.894688077, -14.020302812), (14.923664412, -13.314812824))
            ThreePointArc((14.923664412, -13.314812824), (14.142135624, -14.142135624), (13.314812824, -14.923664412))
            Line((13.314812824, -14.923664412), (14.020302812, -15.894688077))
            ThreePointArc((14.020302812, -15.894688077), (14.35977837, -17.30870554), (13.599962502, -18.548612345))
            Line((13.599962502, -18.548612345), (13.438159103, -18.666169396))
            ThreePointArc((13.438159103, -18.666169396), (12.02414164, -19.005644954), (10.784234835, -18.245829086))
            Line((10.784234835, -18.245829086), (10.078744846, -17.274805421))
            ThreePointArc((10.078744846, -17.274805421), (9.079809995, -17.820130484), (8.051473578, -18.307751725))
            Line((8.051473578, -18.307751725), (8.422371614, -19.449258505))
            ThreePointArc((8.422371614, -19.449258505), (8.308276629, -20.898972744), (7.202496522, -21.843398175))
            Line((7.202496522, -21.843398175), (7.012285219, -21.905201574))
            ThreePointArc((7.012285219, -21.905201574), (5.56257098, -21.791106589), (4.618145549, -20.685326483))
            Line((4.618145549, -20.685326483), (4.247247513, -19.543819703))
            ThreePointArc((4.247247513, -19.543819703), (3.128689301, -19.753766812), (2, -19.899748742))
            Line((2, -19.899748742), (2, -21.1))
            ThreePointArc((2, -21.1), (1.443502884, -22.443502884), (0.1, -23))
            Line((0.1, -23), (-0.1, -23))
            ThreePointArc((-0.1, -23), (-1.443502884, -22.443502884), (-2, -21.1))
            Line((-2, -21.1), (-2, -19.899748742))
            ThreePointArc((-2, -19.899748742), (-3.128689301, -19.753766812), (-4.247247513, -19.543819703))
            Line((-4.247247513, -19.543819703), (-4.618145549, -20.685326483))
            ThreePointArc((-4.618145549, -20.685326483), (-5.56257098, -21.791106589), (-7.012285219, -21.905201574))
            Line((-7.012285219, -21.905201574), (-7.202496522, -21.843398175))
            ThreePointArc((-7.202496522, -21.843398175), (-8.308276629, -20.898972744), (-8.422371614, -19.449258505))
            Line((-8.422371614, -19.449258505), (-8.051473578, -18.307751725))
            ThreePointArc((-8.051473578, -18.307751725), (-9.079809995, -17.820130484), (-10.078744846, -17.274805421))
            Line((-10.078744846, -17.274805421), (-10.784234835, -18.245829086))
            ThreePointArc((-10.784234835, -18.245829086), (-12.02414164, -19.005644954), (-13.438159103, -18.666169396))
            Line((-13.438159103, -18.666169396), (-13.599962502, -18.548612345))
            ThreePointArc((-13.599962502, -18.548612345), (-14.35977837, -17.30870554), (-14.020302812, -15.894688077))
            Line((-14.020302812, -15.894688077), (-13.314812824, -14.923664412))
            ThreePointArc((-13.314812824, -14.923664412), (-14.142135624, -14.142135624), (-14.923664412, -13.314812824))
            Line((-14.923664412, -13.314812824), (-15.894688077, -14.020302812))
            ThreePointArc((-15.894688077, -14.020302812), (-17.30870554, -14.35977837), (-18.548612345, -13.599962502))
            Line((-18.548612345, -13.599962502), (-18.666169396, -13.438159103))
            ThreePointArc((-18.666169396, -13.438159103), (-19.005644954, -12.02414164), (-18.245829086, -10.784234835))
            Line((-18.245829086, -10.784234835), (-17.274805421, -10.078744846))
            ThreePointArc((-17.274805421, -10.078744846), (-17.820130484, -9.079809995), (-18.307751725, -8.051473578))
            Line((-18.307751725, -8.051473578), (-19.449258505, -8.422371614))
            ThreePointArc((-19.449258505, -8.422371614), (-20.898972744, -8.308276629), (-21.843398175, -7.202496522))
            Line((-21.843398175, -7.202496522), (-21.905201574, -7.012285219))
            ThreePointArc((-21.905201574, -7.012285219), (-21.791106589, -5.56257098), (-20.685326483, -4.618145549))
            Line((-20.685326483, -4.618145549), (-19.543819703, -4.247247513))
            ThreePointArc((-19.543819703, -4.247247513), (-19.753766812, -3.128689301), (-19.899748742, -2))
            Line((-19.899748742, -2), (-21.1, -2))
            ThreePointArc((-21.1, -2), (-22.443502884, -1.443502884), (-23, -0.1))
        make_face()
    extrude(amount=BOSS_EXTRUDE2_DEPTH)


solid = part.part
